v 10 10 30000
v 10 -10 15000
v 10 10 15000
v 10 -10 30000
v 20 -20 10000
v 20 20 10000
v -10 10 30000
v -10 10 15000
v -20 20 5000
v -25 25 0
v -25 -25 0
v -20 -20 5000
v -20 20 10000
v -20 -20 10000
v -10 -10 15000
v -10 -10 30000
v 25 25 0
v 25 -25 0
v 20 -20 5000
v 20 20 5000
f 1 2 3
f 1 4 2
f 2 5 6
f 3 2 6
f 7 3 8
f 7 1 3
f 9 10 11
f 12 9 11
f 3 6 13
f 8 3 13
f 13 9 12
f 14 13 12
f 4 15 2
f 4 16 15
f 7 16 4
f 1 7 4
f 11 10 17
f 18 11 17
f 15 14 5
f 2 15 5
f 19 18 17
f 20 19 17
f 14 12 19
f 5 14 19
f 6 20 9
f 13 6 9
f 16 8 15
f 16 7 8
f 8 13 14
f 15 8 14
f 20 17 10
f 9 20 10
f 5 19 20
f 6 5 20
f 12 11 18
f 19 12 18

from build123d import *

# Parameters (mm, degrees)
SKETCH_W    = 50
SKETCH_H    = 50
SKETCH001_W = 40
SKETCH001_H = 40
SKETCH002_W = 40
SKETCH002_H = 40
SKETCH003_W = 20
SKETCH003_H = 20
SKETCH004_W = 20
SKETCH004_H = 20


with BuildPart() as part:
    # Sketch → Loft section 0
    with BuildSketch(Plane.XY):
        Rectangle(SKETCH_W, SKETCH_H)
    # Sketch001 → Loft section 1
    with BuildSketch(Plane.XY.offset(5000)):
        Rectangle(SKETCH001_W, SKETCH001_H)
    # Sketch002 → Loft section 2
    with BuildSketch(Plane.XY.offset(10000)):
        Rectangle(SKETCH002_W, SKETCH002_H)
    # Sketch003 → Loft section 3
    with BuildSketch(Plane.XY.offset(15000)):
        Rectangle(SKETCH003_W, SKETCH003_H)
    # Sketch004 → Loft section 4
    with BuildSketch(Plane.XY.offset(30000)):
        Rectangle(SKETCH004_W, SKETCH004_H)
    loft(ruled=True)


solid = part.part
